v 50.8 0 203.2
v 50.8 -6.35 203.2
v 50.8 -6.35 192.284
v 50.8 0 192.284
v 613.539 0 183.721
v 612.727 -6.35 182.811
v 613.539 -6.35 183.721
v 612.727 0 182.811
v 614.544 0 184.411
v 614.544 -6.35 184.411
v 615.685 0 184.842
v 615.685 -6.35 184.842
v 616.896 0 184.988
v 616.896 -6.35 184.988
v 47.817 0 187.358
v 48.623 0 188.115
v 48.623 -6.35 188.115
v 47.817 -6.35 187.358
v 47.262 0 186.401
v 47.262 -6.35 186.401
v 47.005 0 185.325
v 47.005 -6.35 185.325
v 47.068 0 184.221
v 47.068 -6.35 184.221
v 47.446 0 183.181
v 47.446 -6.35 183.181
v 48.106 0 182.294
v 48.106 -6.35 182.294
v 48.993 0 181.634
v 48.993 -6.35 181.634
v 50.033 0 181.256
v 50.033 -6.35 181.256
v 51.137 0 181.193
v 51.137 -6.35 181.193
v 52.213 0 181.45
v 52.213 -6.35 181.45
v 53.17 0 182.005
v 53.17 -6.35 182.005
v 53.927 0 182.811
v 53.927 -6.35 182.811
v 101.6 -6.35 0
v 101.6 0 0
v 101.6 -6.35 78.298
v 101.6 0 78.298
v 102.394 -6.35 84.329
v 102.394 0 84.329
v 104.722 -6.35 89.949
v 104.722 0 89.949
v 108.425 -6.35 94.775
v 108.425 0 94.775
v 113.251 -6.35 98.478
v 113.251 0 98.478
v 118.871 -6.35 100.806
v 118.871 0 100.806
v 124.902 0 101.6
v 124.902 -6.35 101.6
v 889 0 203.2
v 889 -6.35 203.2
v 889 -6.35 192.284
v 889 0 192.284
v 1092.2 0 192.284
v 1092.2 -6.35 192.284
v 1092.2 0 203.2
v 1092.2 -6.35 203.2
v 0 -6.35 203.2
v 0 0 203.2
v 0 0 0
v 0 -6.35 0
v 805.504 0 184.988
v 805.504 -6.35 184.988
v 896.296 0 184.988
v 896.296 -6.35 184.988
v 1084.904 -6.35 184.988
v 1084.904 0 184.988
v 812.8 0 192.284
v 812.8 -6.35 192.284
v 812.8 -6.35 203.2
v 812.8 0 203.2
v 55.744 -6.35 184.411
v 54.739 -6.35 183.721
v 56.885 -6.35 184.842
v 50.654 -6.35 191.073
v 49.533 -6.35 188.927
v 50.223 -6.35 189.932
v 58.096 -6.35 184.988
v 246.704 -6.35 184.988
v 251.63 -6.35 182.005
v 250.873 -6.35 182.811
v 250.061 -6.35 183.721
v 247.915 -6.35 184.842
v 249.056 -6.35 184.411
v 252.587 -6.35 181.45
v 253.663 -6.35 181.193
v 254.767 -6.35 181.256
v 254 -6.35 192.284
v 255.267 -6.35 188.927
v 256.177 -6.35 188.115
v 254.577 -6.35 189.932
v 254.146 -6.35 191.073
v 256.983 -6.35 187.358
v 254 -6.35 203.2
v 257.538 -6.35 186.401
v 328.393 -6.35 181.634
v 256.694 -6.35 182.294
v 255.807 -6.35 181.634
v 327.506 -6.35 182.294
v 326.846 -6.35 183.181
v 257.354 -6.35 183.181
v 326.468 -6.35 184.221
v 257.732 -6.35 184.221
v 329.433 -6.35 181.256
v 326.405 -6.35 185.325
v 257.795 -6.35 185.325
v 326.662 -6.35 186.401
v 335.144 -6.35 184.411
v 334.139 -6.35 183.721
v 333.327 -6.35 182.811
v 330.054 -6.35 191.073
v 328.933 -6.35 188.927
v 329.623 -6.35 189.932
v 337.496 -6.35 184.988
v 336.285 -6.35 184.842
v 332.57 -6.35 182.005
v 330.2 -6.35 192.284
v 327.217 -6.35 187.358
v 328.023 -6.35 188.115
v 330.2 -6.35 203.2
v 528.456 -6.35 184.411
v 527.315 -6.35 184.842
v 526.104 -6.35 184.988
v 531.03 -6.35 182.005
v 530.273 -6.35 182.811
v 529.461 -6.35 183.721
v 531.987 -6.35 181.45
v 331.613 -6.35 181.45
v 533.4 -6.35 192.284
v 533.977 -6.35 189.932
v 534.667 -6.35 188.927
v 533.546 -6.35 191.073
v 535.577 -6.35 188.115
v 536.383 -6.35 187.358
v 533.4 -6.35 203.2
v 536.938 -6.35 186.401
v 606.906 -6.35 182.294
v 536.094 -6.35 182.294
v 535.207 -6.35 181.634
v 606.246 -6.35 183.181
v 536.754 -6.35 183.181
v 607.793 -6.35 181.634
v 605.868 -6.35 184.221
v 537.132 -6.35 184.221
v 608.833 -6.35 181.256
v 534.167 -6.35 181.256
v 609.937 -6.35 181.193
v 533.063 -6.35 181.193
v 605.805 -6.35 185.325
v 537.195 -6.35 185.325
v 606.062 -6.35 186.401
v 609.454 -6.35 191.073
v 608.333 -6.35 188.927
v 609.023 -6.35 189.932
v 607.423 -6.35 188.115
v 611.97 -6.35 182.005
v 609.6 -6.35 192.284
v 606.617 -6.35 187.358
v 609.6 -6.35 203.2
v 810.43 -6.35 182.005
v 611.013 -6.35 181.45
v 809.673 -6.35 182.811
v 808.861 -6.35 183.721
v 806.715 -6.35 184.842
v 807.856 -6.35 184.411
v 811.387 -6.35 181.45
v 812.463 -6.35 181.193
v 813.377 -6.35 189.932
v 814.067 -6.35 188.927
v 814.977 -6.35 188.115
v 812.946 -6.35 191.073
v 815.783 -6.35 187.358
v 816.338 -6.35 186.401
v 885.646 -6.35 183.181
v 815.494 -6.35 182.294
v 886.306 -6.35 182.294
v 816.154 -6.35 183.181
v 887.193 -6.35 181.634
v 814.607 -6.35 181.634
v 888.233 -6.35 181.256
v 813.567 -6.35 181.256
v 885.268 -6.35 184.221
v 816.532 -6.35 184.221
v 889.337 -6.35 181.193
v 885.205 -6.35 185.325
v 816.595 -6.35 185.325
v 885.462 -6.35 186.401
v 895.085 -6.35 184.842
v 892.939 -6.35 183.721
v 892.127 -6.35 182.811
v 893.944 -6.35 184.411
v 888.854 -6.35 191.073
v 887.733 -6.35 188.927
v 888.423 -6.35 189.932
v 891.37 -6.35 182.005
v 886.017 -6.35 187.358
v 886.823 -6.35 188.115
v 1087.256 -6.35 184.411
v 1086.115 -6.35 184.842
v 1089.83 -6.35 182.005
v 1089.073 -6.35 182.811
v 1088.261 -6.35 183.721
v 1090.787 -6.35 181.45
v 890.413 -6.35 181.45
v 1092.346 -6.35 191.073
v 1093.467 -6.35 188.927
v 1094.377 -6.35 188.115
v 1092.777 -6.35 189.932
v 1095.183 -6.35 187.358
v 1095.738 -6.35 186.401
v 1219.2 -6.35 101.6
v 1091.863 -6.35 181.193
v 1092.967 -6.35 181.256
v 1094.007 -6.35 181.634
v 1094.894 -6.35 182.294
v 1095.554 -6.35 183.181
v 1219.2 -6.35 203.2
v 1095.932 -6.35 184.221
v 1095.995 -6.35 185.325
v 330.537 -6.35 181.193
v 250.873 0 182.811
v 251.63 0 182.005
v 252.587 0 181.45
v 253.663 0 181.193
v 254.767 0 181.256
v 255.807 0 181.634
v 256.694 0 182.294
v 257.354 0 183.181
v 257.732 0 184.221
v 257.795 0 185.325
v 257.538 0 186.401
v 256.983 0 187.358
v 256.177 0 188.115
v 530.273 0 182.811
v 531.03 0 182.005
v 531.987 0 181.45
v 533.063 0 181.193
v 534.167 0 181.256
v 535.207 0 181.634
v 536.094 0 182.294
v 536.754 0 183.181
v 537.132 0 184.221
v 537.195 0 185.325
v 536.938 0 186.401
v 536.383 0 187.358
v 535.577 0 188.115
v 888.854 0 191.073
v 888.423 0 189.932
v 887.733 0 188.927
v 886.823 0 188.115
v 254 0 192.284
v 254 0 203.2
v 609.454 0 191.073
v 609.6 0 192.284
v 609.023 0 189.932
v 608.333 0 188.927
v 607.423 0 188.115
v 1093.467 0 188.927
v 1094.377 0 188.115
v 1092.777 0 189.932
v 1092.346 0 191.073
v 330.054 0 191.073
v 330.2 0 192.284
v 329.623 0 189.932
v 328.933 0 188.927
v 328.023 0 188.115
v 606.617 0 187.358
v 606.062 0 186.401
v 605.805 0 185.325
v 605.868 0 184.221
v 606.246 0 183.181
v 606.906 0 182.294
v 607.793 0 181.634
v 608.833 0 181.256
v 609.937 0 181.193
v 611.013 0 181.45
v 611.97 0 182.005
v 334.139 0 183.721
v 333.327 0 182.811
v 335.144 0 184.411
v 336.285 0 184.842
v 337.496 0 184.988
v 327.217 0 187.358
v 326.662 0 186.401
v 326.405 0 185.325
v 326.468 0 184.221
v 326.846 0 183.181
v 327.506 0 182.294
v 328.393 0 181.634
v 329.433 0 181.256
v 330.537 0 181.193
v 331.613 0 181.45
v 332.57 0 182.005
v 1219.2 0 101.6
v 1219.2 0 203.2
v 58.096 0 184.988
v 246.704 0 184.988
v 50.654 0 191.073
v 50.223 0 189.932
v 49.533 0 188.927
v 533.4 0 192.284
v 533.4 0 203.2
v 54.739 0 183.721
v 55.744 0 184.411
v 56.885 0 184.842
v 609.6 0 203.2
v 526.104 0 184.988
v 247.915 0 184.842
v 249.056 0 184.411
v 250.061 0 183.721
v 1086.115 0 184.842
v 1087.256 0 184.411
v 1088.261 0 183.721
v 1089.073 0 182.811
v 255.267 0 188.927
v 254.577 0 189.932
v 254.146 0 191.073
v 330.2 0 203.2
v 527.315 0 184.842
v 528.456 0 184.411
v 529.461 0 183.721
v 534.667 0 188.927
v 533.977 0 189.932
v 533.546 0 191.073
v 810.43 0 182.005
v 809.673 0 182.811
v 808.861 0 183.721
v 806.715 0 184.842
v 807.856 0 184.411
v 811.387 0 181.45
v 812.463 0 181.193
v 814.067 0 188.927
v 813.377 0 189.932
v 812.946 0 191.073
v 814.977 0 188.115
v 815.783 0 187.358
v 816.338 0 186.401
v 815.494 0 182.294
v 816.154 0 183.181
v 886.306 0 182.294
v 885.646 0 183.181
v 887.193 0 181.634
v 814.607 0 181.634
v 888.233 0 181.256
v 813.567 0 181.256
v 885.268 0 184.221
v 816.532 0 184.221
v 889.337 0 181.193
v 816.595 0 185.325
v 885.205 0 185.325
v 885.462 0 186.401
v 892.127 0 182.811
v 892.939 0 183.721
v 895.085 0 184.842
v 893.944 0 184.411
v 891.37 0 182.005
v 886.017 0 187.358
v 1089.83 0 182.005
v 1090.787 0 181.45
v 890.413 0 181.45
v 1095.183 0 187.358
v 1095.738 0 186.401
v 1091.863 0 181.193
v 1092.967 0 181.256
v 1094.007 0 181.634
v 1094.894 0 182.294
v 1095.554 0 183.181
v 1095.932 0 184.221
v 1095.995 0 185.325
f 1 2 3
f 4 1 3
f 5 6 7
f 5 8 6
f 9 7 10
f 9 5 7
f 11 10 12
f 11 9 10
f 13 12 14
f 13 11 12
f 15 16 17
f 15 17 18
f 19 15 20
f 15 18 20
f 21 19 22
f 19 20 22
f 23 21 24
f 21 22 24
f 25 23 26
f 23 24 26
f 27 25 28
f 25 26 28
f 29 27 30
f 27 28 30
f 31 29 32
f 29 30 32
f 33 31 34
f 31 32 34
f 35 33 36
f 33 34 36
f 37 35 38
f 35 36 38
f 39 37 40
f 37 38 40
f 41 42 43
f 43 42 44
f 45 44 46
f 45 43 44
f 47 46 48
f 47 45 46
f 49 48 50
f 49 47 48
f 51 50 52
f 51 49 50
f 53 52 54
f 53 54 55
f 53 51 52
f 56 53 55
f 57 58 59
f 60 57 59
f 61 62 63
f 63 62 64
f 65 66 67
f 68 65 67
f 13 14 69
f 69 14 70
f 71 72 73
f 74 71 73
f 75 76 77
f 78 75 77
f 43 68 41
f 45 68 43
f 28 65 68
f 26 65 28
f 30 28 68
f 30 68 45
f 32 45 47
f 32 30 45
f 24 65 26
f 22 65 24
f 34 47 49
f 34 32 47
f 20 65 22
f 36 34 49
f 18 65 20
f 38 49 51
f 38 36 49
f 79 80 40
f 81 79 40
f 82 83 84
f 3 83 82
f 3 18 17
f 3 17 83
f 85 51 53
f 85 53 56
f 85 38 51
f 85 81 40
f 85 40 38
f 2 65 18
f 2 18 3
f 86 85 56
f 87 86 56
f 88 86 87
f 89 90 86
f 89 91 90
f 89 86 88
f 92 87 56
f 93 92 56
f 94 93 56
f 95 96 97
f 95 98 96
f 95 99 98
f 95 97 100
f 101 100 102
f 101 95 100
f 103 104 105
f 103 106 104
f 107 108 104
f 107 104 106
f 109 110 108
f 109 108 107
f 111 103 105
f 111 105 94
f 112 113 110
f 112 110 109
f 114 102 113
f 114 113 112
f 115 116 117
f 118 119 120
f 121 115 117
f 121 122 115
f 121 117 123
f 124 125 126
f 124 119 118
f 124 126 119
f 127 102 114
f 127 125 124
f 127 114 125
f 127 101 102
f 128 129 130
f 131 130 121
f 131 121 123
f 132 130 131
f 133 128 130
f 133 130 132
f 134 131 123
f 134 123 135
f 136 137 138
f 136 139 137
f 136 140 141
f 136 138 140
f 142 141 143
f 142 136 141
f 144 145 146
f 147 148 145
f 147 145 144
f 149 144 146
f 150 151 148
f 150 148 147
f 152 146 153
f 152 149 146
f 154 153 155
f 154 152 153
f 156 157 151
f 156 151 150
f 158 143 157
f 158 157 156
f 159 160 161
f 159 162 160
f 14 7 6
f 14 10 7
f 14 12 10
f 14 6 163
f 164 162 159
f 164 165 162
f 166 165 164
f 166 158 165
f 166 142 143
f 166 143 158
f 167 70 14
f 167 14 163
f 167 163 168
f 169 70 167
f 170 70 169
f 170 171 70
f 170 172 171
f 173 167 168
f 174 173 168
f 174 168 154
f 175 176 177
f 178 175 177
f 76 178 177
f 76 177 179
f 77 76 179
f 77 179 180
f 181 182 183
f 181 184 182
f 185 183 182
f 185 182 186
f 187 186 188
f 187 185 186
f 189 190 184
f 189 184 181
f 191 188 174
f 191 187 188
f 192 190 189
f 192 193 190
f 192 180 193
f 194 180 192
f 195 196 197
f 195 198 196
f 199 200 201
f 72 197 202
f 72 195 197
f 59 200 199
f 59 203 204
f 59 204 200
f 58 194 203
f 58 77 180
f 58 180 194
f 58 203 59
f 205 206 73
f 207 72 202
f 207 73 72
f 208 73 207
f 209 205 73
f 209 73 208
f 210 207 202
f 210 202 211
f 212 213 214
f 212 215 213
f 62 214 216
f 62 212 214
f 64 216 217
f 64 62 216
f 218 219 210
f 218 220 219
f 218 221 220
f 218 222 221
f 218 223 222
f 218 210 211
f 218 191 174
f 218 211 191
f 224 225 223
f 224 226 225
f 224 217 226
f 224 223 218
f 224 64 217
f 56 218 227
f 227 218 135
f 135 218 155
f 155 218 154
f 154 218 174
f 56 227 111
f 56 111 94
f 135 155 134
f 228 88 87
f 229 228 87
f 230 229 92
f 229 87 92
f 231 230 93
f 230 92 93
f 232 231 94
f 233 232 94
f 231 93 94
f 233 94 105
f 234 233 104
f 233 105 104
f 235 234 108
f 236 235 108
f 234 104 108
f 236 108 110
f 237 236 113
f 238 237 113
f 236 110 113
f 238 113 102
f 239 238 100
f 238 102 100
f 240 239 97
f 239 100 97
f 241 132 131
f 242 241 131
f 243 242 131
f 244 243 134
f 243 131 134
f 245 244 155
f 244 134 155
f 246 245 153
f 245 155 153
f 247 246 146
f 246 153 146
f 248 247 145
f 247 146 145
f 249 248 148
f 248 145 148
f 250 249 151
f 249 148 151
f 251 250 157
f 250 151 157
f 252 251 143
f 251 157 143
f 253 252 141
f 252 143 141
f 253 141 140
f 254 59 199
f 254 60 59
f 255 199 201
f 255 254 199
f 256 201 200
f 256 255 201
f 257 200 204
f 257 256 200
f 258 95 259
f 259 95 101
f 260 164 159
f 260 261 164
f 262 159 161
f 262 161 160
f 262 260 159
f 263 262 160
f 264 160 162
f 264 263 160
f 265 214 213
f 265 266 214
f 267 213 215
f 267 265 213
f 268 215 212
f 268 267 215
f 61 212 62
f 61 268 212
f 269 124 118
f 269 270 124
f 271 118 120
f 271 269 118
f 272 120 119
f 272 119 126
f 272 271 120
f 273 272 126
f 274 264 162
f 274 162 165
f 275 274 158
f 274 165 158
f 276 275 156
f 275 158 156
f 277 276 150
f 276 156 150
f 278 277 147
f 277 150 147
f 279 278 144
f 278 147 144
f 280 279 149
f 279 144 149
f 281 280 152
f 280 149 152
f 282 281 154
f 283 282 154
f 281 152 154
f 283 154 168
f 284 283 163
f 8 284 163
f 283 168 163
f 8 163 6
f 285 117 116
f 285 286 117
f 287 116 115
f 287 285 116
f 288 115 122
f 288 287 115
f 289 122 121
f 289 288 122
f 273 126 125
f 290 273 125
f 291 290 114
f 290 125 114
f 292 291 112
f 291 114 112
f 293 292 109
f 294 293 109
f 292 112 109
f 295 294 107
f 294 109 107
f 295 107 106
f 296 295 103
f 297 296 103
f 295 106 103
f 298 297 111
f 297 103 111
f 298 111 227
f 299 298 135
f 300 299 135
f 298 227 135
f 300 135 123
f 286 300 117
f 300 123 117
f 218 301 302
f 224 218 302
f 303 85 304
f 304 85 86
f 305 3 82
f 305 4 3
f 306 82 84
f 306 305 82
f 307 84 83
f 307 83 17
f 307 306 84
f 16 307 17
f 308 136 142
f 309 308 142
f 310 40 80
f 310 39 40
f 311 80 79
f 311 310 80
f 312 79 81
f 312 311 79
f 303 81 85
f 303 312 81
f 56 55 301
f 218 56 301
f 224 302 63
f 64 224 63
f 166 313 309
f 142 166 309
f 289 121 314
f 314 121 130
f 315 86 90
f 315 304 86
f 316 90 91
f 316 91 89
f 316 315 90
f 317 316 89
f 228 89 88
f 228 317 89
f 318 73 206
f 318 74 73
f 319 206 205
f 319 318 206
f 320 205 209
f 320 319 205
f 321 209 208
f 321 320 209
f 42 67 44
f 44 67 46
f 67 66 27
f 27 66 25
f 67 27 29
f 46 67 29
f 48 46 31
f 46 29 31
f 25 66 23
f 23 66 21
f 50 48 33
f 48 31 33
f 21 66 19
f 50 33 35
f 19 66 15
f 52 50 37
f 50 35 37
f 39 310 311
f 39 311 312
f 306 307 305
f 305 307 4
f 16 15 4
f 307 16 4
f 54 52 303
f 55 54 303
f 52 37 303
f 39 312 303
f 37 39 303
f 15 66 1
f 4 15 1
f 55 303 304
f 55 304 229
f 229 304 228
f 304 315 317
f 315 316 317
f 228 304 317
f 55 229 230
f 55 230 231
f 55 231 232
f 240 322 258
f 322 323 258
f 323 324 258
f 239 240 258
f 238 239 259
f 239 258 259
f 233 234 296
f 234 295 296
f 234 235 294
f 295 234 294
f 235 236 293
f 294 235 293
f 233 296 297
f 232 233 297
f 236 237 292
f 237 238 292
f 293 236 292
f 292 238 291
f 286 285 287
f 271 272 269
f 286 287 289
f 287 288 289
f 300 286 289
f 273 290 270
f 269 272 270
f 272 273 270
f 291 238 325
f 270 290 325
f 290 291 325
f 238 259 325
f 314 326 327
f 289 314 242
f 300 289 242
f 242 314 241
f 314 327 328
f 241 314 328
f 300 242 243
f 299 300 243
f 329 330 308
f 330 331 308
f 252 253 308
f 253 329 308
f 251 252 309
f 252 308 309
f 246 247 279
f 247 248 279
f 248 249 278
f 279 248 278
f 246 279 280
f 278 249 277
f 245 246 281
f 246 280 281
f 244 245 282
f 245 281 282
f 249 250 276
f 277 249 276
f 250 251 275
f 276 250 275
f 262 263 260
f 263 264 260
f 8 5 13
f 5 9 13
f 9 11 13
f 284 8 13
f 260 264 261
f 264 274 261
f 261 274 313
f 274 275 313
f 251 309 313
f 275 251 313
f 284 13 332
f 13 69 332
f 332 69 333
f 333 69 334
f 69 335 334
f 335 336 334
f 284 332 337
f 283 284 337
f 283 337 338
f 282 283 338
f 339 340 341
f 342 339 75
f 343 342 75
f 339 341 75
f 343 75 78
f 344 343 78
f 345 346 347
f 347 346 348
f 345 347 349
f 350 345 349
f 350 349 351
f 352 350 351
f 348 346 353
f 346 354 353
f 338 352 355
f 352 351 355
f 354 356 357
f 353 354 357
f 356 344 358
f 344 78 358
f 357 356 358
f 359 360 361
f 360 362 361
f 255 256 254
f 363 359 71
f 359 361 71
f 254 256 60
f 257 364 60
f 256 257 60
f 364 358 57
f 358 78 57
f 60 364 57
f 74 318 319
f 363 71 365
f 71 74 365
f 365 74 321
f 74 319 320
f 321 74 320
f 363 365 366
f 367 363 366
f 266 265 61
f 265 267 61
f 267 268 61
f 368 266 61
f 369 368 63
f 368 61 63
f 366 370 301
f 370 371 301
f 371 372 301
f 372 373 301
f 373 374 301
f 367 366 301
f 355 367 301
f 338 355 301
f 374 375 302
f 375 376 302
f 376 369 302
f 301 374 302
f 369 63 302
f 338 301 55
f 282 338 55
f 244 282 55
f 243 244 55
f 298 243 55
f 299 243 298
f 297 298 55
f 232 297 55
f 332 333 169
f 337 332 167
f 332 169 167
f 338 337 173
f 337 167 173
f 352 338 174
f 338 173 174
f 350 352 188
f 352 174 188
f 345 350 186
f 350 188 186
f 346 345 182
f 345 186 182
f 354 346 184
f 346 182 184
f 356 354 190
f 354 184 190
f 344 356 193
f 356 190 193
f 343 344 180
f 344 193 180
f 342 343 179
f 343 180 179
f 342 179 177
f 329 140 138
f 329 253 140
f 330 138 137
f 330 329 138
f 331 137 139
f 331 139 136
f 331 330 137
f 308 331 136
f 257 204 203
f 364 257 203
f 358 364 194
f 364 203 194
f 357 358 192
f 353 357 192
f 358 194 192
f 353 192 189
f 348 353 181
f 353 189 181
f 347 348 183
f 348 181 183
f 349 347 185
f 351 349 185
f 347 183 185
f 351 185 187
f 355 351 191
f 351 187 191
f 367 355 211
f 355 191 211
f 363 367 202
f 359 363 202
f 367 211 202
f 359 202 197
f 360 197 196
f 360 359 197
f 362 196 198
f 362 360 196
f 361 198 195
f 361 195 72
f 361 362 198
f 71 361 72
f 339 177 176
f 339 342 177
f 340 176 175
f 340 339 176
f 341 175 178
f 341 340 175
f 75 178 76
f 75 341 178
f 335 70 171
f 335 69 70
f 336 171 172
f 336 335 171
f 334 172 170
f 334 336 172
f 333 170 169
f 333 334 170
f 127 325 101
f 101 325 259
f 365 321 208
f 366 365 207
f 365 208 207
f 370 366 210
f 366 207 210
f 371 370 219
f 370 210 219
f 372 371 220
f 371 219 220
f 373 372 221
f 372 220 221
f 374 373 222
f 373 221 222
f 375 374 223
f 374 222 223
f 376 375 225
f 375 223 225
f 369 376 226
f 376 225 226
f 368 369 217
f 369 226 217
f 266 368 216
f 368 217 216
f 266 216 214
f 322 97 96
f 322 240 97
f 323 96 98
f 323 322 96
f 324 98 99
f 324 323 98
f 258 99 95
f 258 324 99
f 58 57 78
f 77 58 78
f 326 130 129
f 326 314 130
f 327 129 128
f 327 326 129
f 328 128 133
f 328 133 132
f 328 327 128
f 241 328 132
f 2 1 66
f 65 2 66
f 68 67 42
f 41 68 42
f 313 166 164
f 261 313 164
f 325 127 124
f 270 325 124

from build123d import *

# Parameters (mm, degrees)
F1_DEPTH = 6.35
F3_DEPTH = 6.351
F4_R     = 5.08
F5_R     = 23.301989


with BuildPart() as f1:
    # F0 (on Front) → F1 (new body)
    with BuildSketch(Plane.XZ):
        Polygon((0, 203.2), (0, 0), (101.6, 0), (101.6, 101.6), (1219.2, 101.6), (1219.2, 203.2), align=None)
    extrude(amount=F1_DEPTH)

    # F2 (on face) → F3 (cut, through all)
    with BuildSketch(Plane.XZ.offset(6.35)):
        with BuildLine():
            Line((254, 184.9882), (250.19, 184.9882))
            ThreePointArc((250.19, 184.9882), (256.694077, 182.294123), (254, 188.7982))
            Line((254, 188.7982), (254, 184.9882))
        make_face()
        with BuildLine():
            Line((50.8, 184.9882), (50.8, 188.7982))
            ThreePointArc((50.8, 188.7982), (48.105923, 182.294123), (54.61, 184.9882))
            Line((54.61, 184.9882), (50.8, 184.9882))
        make_face()
        with BuildLine():
            Line((533.4, 184.9882), (529.59, 184.9882))
            ThreePointArc((529.59, 184.9882), (536.094077, 182.294123), (533.4, 188.7982))
            Line((533.4, 188.7982), (533.4, 184.9882))
        make_face()
        with BuildLine():
            Line((330.2, 184.9882), (330.2, 188.7982))
            ThreePointArc((330.2, 188.7982), (327.505923, 182.294123), (334.01, 184.9882))
            Line((334.01, 184.9882), (330.2, 184.9882))
        make_face()
        with BuildLine():
            Line((812.8, 184.9882), (808.99, 184.9882))
            ThreePointArc((808.99, 184.9882), (815.494077, 182.294123), (812.8, 188.7982))
            Line((812.8, 188.7982), (812.8, 184.9882))
        make_face()
        with BuildLine():
            Line((609.6, 184.9882), (609.6, 188.7982))
            ThreePointArc((609.6, 188.7982), (606.905923, 182.294123), (613.41, 184.9882))
            Line((613.41, 184.9882), (609.6, 184.9882))
        make_face()
        with BuildLine():
            Line((1092.2, 184.9882), (1088.39, 184.9882))
            ThreePointArc((1088.39, 184.9882), (1094.894077, 182.294123), (1092.2, 188.7982))
            Line((1092.2, 188.7982), (1092.2, 184.9882))
        make_face()
        with BuildLine():
            Line((889, 184.9882), (889, 188.7982))
            ThreePointArc((889, 188.7982), (886.305923, 182.294123), (892.81, 184.9882))
            Line((892.81, 184.9882), (889, 184.9882))
        make_face()
        Polygon((254, 203.2), (50.8, 203.2), (50.8, 188.7982), (50.8, 184.9882), (54.61, 184.9882), (152.4, 184.9882), (250.19, 184.9882), (254, 184.9882), (254, 188.7982), align=None)
        Polygon((533.4, 203.2), (330.2, 203.2), (330.2, 188.7982), (330.2, 184.9882), (334.01, 184.9882), (431.8, 184.9882), (529.59, 184.9882), (533.4, 184.9882), (533.4, 188.7982), align=None)
        Polygon((812.8, 203.2), (609.6, 203.2), (609.6, 188.7982), (609.6, 184.9882), (613.41, 184.9882), (711.2, 184.9882), (808.99, 184.9882), (812.8, 184.9882), (812.8, 188.7982), align=None)
        Polygon((1092.2, 203.2), (889, 203.2), (889, 188.7982), (889, 184.9882), (892.81, 184.9882), (990.6, 184.9882), (1088.39, 184.9882), (1092.2, 184.9882), (1092.2, 188.7982), align=None)
    extrude(amount=-F3_DEPTH, mode=Mode.SUBTRACT)

    # F4
    f4_edges = [f1.edges().sort_by_distance(p)[0] for p in [
        (334.01, -3.175, 184.9882),
        (330.2, -3.175, 188.7982),
        (529.59, -3.175, 184.9882),
        (533.4, -3.175, 188.7982),
        (54.61, -3.175, 184.9882),
        (50.8, -3.175, 188.7982),
        (250.19, -3.175, 184.9882),
        (254, -3.175, 188.7982),
        (1092.2, -3.175, 188.7982),
        (1088.39, -3.175, 184.9882),
        (812.8, -3.175, 188.7982),
        (808.99, -3.175, 184.9882),
        (609.6, -3.175, 188.7982),
        (613.41, -3.175, 184.9882),
        (889, -3.175, 188.7982),
        (892.81, -3.175, 184.9882),
    ]]
    fillet(f4_edges, radius=F4_R)

    # F5
    f5_edges = [f1.edges().sort_by_distance(p)[0] for p in [
        (101.6, -3.175, 101.6),
    ]]
    fillet(f5_edges, radius=F5_R)


solid = f1.part
